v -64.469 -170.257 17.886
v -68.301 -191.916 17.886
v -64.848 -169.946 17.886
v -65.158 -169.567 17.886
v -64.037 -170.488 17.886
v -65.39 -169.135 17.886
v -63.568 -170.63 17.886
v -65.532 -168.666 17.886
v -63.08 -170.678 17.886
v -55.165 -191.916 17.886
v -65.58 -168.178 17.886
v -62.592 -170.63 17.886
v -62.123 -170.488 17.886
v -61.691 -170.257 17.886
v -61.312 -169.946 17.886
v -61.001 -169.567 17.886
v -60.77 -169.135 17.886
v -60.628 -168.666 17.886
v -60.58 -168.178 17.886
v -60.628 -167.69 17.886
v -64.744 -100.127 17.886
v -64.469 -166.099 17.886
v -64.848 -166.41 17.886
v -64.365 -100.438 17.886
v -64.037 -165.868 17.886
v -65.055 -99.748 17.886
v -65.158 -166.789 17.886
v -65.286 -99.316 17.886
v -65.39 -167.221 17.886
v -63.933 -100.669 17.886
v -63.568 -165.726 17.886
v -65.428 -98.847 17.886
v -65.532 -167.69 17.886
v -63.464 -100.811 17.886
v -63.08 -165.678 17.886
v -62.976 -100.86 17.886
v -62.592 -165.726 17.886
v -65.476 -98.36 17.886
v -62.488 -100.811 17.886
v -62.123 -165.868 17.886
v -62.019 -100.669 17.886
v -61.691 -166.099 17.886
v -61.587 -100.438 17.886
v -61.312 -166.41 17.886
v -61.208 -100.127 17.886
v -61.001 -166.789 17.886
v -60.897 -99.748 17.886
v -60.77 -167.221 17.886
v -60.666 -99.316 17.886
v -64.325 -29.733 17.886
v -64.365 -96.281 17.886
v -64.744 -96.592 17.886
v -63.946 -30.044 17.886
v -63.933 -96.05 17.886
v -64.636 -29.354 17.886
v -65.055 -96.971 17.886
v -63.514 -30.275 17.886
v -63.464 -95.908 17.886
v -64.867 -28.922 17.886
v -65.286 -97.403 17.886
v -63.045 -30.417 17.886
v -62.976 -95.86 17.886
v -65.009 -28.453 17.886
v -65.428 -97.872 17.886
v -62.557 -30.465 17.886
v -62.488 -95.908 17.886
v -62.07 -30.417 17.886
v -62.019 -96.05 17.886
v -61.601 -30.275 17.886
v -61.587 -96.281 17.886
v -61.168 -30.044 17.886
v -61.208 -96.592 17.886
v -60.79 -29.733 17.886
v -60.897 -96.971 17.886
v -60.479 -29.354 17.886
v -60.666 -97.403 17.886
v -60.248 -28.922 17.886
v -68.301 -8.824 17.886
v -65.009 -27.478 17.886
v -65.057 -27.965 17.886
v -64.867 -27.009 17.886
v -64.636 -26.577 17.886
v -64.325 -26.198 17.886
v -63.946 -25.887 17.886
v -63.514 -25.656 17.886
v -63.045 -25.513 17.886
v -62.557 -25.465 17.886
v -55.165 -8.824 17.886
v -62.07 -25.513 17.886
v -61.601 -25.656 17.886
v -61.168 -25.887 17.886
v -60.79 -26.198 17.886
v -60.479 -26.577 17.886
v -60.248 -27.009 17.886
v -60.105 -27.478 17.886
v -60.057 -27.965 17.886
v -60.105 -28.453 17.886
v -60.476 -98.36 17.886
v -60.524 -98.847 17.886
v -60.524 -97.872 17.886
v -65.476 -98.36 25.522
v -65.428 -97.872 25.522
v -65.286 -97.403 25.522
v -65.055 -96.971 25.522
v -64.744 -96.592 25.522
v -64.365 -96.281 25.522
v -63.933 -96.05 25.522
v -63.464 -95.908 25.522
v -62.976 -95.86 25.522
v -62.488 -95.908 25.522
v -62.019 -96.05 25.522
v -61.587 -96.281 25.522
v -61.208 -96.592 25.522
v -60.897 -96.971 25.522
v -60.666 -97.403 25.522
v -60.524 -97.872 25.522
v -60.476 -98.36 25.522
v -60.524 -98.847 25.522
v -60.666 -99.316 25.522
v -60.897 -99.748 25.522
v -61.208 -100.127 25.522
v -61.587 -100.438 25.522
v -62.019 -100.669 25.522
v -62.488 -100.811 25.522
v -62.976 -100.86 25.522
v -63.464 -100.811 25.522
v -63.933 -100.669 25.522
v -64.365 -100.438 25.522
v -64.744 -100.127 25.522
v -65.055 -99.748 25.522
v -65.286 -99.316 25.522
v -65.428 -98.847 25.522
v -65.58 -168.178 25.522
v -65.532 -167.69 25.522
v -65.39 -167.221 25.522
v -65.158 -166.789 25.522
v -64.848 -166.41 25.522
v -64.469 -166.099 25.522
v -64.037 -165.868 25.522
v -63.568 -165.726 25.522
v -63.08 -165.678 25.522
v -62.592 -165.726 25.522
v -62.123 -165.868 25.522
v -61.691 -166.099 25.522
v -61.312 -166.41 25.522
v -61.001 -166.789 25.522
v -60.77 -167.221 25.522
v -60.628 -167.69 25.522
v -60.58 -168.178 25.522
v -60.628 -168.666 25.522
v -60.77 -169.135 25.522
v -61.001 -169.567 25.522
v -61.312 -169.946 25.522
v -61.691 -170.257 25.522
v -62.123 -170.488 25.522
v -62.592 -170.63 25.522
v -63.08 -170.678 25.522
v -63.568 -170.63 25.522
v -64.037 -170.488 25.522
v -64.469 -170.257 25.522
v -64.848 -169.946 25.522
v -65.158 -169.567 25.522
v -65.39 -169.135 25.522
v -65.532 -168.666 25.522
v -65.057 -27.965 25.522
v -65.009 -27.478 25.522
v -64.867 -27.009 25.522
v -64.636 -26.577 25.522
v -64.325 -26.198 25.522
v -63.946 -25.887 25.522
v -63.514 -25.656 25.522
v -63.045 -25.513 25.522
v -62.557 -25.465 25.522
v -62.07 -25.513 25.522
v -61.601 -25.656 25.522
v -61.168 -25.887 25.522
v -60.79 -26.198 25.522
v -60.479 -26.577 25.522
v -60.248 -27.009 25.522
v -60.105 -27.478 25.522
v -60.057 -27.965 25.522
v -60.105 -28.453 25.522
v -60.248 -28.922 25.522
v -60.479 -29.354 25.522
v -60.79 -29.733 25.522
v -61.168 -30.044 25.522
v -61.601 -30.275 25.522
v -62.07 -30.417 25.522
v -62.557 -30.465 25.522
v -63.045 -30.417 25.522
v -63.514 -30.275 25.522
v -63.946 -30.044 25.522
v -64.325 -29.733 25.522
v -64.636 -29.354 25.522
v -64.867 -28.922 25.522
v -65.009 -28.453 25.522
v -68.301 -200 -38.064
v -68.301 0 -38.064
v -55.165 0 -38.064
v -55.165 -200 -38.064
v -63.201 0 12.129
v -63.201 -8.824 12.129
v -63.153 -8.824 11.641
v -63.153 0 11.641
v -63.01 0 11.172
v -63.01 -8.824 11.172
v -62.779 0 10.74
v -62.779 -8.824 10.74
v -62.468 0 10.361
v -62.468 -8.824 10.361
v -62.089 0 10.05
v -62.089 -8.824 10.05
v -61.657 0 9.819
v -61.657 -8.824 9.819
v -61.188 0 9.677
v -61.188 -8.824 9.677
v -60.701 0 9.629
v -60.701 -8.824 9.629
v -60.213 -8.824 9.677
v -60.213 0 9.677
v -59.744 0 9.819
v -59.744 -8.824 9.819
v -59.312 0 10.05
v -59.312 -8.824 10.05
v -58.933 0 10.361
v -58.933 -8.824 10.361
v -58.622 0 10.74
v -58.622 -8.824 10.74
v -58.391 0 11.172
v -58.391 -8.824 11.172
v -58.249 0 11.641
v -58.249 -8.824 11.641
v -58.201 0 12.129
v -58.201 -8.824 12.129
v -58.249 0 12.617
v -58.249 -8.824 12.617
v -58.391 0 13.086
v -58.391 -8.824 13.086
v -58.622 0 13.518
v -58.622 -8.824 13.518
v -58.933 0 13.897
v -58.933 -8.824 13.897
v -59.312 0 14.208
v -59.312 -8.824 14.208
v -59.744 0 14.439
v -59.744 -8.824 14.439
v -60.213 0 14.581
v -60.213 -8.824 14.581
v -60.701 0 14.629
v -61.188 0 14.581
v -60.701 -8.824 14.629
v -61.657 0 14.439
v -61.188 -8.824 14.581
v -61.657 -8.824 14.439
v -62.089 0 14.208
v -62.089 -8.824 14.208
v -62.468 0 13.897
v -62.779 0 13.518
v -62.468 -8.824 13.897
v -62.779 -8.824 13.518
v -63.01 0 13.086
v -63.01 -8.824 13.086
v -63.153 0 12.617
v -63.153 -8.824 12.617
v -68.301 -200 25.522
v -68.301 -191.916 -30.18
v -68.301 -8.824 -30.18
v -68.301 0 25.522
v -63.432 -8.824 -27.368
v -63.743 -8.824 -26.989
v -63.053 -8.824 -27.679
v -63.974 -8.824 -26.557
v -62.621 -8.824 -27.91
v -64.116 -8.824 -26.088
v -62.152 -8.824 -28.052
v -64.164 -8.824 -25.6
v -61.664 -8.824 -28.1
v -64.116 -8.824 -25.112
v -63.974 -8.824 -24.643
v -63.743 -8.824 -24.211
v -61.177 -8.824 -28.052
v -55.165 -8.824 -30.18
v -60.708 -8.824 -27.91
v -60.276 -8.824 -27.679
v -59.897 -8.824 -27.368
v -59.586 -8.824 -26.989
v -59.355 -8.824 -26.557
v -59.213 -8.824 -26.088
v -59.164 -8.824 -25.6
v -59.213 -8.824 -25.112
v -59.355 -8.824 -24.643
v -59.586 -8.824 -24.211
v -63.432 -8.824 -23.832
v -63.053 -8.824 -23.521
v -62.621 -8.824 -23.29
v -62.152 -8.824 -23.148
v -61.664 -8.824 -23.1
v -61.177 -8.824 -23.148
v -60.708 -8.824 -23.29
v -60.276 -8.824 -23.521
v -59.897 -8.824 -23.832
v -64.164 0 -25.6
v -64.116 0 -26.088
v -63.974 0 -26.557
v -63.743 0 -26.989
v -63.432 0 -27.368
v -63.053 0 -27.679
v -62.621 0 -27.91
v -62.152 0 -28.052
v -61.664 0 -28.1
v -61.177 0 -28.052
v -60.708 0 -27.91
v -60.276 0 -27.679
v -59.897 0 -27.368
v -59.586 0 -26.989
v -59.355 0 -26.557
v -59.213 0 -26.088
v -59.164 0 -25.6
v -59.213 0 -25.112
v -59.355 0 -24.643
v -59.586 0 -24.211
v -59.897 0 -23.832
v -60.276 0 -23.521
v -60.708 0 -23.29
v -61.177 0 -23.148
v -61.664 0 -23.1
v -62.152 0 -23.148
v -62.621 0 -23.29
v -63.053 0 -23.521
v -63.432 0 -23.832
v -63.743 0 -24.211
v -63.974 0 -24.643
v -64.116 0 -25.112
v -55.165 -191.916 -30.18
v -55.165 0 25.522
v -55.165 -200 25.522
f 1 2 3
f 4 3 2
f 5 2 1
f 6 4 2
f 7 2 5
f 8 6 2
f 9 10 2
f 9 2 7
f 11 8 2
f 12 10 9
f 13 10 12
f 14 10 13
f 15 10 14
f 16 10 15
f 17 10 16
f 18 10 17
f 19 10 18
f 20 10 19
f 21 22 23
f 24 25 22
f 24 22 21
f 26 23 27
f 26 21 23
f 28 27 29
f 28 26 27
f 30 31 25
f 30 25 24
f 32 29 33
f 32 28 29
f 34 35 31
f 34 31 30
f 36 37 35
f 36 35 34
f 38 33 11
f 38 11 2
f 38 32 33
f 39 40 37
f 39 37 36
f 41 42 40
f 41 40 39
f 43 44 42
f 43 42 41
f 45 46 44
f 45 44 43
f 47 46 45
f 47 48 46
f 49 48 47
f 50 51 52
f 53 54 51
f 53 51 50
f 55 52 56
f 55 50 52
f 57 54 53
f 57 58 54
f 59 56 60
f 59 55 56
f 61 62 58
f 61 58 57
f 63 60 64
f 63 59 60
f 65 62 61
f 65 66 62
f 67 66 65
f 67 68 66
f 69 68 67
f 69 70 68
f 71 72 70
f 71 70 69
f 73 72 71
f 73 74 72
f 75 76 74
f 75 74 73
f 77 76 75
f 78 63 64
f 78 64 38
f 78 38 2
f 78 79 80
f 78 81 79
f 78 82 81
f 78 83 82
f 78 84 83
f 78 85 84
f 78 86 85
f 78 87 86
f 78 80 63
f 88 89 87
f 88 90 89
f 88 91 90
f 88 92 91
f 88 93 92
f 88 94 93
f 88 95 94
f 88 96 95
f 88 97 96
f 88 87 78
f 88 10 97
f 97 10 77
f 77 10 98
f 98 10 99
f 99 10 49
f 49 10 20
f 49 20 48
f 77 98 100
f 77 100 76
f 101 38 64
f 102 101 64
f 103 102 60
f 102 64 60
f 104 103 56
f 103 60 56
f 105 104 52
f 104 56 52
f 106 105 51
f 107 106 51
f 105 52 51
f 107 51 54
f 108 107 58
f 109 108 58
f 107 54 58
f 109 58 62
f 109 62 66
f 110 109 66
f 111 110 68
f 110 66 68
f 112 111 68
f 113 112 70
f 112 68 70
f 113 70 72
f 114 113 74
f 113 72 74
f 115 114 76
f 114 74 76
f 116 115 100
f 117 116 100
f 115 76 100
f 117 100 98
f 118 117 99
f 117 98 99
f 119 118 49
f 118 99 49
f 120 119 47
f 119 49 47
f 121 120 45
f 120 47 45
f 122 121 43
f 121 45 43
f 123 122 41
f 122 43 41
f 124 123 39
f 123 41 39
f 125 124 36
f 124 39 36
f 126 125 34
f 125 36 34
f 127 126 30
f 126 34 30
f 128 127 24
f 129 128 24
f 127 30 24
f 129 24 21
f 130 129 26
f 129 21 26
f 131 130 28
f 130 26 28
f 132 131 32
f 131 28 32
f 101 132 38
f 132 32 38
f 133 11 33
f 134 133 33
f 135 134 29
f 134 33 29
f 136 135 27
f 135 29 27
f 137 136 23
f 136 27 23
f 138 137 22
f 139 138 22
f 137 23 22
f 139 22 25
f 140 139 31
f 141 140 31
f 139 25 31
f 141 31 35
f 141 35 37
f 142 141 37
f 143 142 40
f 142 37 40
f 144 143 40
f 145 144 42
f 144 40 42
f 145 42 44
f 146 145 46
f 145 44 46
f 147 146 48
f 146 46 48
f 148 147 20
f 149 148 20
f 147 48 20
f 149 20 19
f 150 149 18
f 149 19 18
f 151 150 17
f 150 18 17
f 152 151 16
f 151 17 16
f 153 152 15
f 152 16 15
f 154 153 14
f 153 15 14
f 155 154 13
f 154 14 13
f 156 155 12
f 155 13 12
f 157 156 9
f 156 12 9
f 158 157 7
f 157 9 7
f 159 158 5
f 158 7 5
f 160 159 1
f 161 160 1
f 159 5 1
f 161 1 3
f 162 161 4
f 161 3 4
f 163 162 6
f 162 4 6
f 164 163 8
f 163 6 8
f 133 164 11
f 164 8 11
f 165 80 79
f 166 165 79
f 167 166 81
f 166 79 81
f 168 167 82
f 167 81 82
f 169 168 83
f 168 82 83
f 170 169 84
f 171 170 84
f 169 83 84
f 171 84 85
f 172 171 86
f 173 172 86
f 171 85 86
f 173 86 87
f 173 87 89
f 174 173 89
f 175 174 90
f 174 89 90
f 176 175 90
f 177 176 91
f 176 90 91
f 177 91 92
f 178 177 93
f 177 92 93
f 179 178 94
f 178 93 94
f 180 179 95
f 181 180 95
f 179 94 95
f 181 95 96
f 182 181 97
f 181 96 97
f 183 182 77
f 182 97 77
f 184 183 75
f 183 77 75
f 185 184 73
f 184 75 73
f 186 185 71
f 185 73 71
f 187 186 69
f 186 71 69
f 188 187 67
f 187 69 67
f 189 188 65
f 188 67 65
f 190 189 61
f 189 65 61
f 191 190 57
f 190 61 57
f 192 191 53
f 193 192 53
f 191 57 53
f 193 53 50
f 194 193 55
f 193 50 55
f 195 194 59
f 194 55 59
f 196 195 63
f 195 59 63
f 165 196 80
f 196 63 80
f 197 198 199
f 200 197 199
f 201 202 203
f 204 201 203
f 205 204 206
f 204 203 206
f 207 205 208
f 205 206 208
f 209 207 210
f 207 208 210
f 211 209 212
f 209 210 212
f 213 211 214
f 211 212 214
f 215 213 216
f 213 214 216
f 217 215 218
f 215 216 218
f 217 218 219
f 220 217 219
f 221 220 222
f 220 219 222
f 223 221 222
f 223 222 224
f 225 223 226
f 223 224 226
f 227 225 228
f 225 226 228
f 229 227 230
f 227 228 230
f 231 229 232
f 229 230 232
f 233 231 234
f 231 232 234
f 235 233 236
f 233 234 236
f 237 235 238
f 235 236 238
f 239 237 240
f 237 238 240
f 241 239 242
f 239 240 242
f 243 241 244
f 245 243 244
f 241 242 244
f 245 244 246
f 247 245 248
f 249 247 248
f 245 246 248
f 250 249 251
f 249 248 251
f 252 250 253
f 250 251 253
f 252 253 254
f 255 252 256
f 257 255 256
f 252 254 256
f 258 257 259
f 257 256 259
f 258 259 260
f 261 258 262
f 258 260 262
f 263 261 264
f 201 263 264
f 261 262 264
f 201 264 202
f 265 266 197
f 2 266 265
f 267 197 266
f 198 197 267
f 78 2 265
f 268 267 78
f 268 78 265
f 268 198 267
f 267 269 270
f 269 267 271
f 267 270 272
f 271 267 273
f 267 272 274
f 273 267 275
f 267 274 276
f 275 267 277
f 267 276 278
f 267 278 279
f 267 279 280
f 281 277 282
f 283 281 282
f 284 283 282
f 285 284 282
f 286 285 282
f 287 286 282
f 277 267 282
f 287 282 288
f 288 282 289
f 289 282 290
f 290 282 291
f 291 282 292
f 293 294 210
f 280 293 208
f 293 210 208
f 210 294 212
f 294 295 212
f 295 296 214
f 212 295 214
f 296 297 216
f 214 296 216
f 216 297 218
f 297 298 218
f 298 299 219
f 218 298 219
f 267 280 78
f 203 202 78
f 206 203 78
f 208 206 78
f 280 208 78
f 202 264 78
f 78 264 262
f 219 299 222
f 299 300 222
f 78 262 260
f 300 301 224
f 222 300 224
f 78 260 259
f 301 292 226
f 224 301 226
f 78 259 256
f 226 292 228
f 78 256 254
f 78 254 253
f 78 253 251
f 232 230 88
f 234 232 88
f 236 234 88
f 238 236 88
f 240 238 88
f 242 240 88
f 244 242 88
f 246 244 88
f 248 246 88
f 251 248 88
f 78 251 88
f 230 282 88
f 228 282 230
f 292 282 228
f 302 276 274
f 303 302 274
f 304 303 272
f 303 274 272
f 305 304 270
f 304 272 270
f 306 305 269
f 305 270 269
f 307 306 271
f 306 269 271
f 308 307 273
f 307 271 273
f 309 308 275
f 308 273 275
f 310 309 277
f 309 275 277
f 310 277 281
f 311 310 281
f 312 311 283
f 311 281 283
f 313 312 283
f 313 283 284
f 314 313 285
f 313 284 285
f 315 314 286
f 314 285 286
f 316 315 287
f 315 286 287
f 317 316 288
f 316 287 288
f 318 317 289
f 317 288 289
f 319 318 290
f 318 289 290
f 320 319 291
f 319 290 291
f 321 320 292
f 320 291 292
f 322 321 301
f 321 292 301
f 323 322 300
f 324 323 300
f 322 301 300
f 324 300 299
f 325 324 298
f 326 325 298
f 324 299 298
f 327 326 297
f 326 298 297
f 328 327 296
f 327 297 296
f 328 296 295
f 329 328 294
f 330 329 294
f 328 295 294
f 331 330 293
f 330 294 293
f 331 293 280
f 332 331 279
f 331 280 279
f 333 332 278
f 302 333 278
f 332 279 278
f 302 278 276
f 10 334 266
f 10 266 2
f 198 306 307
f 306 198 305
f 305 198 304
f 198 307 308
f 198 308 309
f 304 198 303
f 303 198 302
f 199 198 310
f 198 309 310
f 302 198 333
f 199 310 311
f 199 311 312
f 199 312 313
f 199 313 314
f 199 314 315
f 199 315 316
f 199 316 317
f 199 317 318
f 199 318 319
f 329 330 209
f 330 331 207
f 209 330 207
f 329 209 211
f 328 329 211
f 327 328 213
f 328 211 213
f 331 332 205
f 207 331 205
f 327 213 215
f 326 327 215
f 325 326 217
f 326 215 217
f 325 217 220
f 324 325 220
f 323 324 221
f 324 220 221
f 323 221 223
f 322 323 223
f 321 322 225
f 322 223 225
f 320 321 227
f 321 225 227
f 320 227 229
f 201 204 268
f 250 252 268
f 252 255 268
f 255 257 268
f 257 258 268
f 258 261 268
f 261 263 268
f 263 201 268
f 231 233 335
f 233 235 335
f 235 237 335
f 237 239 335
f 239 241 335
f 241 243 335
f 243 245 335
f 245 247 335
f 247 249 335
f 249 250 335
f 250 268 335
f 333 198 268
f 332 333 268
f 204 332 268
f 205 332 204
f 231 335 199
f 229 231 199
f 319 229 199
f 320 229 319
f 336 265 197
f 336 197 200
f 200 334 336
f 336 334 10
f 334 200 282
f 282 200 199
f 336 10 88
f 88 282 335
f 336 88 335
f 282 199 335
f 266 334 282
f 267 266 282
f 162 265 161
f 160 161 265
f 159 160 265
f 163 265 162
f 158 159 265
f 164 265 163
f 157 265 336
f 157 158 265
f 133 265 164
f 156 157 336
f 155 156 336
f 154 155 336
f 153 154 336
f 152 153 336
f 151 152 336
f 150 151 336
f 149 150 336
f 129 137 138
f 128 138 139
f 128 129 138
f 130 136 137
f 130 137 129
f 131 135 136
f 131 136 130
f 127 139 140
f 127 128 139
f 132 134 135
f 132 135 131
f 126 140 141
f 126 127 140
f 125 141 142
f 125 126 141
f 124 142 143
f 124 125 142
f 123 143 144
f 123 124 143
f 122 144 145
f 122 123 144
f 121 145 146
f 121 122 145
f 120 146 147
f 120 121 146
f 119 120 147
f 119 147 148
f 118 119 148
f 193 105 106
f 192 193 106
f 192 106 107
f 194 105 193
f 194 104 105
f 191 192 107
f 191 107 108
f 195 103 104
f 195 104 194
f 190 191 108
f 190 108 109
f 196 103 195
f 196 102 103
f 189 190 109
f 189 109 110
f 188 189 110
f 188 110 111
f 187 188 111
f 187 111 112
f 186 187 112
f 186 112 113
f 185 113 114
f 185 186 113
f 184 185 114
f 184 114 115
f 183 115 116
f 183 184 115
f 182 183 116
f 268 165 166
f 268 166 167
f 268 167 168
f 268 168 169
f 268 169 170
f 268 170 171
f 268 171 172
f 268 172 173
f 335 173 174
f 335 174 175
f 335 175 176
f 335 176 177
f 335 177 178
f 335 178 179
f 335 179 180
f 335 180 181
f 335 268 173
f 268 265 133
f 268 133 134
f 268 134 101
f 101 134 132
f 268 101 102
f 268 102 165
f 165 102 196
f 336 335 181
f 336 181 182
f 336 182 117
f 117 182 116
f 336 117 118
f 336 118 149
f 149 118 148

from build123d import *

# Parameters (mm, degrees)
F0_W     = 13.1360664964
F0_H     = 63.5863877833
F1_DEPTH = 200
F3_D     = 5
F3_DEPTH = 12
F3_TIP   = 1.5021515476
F5_D     = 5
F5_DEPTH = 12
F5_TIP   = 1.5021515476
F6_W     = 183.091968298
F6_H     = 48.0650532991
F7_DEPTH = 25


with BuildPart() as f1:
    # F0 (on Front) → F1 (new body)
    with BuildSketch(Plane.XZ):
        with Locations((-61.7326833308, -6.2711592764)):
            Rectangle(F0_W, F0_H)
    extrude(amount=F1_DEPTH)

    # F3
    with Locations(Plane.XY.offset(25.5220346153)):
        with Locations((-63.0798041821, -168.1778728962), (-62.9759728909, -98.3595103025), (-62.5574141741, -27.9654413462)):
            Hole(F3_D / 2, depth=F3_DEPTH)
            with Locations((0, 0, -(F3_DEPTH + F3_TIP / 2))):  # 118° drill point
                Cone(0, F3_D / 2, F3_TIP, mode=Mode.SUBTRACT)

    # F5
    with Locations(Plane(origin=(0, 0, 0), x_dir=(1, 0, 0), z_dir=(0, 1, 0))):
        with Locations((-60.7005506754, -12.1290553361), (-61.6644993424, 25.6001017988)):
            Hole(F5_D / 2, depth=F5_DEPTH)
            with Locations((0, 0, -(F5_DEPTH + F5_TIP / 2))):  # 118° drill point
                Cone(0, F5_D / 2, F5_TIP, mode=Mode.SUBTRACT)

    # F6 (on face) → F7 (cut)
    with BuildSketch(Plane.YZ.offset(-55.1646500826)):
        with Locations((-100.3695875406, -6.1469888315)):
            Rectangle(F6_W, F6_H)
    extrude(amount=-F7_DEPTH, mode=Mode.SUBTRACT)


solid = f1.part
